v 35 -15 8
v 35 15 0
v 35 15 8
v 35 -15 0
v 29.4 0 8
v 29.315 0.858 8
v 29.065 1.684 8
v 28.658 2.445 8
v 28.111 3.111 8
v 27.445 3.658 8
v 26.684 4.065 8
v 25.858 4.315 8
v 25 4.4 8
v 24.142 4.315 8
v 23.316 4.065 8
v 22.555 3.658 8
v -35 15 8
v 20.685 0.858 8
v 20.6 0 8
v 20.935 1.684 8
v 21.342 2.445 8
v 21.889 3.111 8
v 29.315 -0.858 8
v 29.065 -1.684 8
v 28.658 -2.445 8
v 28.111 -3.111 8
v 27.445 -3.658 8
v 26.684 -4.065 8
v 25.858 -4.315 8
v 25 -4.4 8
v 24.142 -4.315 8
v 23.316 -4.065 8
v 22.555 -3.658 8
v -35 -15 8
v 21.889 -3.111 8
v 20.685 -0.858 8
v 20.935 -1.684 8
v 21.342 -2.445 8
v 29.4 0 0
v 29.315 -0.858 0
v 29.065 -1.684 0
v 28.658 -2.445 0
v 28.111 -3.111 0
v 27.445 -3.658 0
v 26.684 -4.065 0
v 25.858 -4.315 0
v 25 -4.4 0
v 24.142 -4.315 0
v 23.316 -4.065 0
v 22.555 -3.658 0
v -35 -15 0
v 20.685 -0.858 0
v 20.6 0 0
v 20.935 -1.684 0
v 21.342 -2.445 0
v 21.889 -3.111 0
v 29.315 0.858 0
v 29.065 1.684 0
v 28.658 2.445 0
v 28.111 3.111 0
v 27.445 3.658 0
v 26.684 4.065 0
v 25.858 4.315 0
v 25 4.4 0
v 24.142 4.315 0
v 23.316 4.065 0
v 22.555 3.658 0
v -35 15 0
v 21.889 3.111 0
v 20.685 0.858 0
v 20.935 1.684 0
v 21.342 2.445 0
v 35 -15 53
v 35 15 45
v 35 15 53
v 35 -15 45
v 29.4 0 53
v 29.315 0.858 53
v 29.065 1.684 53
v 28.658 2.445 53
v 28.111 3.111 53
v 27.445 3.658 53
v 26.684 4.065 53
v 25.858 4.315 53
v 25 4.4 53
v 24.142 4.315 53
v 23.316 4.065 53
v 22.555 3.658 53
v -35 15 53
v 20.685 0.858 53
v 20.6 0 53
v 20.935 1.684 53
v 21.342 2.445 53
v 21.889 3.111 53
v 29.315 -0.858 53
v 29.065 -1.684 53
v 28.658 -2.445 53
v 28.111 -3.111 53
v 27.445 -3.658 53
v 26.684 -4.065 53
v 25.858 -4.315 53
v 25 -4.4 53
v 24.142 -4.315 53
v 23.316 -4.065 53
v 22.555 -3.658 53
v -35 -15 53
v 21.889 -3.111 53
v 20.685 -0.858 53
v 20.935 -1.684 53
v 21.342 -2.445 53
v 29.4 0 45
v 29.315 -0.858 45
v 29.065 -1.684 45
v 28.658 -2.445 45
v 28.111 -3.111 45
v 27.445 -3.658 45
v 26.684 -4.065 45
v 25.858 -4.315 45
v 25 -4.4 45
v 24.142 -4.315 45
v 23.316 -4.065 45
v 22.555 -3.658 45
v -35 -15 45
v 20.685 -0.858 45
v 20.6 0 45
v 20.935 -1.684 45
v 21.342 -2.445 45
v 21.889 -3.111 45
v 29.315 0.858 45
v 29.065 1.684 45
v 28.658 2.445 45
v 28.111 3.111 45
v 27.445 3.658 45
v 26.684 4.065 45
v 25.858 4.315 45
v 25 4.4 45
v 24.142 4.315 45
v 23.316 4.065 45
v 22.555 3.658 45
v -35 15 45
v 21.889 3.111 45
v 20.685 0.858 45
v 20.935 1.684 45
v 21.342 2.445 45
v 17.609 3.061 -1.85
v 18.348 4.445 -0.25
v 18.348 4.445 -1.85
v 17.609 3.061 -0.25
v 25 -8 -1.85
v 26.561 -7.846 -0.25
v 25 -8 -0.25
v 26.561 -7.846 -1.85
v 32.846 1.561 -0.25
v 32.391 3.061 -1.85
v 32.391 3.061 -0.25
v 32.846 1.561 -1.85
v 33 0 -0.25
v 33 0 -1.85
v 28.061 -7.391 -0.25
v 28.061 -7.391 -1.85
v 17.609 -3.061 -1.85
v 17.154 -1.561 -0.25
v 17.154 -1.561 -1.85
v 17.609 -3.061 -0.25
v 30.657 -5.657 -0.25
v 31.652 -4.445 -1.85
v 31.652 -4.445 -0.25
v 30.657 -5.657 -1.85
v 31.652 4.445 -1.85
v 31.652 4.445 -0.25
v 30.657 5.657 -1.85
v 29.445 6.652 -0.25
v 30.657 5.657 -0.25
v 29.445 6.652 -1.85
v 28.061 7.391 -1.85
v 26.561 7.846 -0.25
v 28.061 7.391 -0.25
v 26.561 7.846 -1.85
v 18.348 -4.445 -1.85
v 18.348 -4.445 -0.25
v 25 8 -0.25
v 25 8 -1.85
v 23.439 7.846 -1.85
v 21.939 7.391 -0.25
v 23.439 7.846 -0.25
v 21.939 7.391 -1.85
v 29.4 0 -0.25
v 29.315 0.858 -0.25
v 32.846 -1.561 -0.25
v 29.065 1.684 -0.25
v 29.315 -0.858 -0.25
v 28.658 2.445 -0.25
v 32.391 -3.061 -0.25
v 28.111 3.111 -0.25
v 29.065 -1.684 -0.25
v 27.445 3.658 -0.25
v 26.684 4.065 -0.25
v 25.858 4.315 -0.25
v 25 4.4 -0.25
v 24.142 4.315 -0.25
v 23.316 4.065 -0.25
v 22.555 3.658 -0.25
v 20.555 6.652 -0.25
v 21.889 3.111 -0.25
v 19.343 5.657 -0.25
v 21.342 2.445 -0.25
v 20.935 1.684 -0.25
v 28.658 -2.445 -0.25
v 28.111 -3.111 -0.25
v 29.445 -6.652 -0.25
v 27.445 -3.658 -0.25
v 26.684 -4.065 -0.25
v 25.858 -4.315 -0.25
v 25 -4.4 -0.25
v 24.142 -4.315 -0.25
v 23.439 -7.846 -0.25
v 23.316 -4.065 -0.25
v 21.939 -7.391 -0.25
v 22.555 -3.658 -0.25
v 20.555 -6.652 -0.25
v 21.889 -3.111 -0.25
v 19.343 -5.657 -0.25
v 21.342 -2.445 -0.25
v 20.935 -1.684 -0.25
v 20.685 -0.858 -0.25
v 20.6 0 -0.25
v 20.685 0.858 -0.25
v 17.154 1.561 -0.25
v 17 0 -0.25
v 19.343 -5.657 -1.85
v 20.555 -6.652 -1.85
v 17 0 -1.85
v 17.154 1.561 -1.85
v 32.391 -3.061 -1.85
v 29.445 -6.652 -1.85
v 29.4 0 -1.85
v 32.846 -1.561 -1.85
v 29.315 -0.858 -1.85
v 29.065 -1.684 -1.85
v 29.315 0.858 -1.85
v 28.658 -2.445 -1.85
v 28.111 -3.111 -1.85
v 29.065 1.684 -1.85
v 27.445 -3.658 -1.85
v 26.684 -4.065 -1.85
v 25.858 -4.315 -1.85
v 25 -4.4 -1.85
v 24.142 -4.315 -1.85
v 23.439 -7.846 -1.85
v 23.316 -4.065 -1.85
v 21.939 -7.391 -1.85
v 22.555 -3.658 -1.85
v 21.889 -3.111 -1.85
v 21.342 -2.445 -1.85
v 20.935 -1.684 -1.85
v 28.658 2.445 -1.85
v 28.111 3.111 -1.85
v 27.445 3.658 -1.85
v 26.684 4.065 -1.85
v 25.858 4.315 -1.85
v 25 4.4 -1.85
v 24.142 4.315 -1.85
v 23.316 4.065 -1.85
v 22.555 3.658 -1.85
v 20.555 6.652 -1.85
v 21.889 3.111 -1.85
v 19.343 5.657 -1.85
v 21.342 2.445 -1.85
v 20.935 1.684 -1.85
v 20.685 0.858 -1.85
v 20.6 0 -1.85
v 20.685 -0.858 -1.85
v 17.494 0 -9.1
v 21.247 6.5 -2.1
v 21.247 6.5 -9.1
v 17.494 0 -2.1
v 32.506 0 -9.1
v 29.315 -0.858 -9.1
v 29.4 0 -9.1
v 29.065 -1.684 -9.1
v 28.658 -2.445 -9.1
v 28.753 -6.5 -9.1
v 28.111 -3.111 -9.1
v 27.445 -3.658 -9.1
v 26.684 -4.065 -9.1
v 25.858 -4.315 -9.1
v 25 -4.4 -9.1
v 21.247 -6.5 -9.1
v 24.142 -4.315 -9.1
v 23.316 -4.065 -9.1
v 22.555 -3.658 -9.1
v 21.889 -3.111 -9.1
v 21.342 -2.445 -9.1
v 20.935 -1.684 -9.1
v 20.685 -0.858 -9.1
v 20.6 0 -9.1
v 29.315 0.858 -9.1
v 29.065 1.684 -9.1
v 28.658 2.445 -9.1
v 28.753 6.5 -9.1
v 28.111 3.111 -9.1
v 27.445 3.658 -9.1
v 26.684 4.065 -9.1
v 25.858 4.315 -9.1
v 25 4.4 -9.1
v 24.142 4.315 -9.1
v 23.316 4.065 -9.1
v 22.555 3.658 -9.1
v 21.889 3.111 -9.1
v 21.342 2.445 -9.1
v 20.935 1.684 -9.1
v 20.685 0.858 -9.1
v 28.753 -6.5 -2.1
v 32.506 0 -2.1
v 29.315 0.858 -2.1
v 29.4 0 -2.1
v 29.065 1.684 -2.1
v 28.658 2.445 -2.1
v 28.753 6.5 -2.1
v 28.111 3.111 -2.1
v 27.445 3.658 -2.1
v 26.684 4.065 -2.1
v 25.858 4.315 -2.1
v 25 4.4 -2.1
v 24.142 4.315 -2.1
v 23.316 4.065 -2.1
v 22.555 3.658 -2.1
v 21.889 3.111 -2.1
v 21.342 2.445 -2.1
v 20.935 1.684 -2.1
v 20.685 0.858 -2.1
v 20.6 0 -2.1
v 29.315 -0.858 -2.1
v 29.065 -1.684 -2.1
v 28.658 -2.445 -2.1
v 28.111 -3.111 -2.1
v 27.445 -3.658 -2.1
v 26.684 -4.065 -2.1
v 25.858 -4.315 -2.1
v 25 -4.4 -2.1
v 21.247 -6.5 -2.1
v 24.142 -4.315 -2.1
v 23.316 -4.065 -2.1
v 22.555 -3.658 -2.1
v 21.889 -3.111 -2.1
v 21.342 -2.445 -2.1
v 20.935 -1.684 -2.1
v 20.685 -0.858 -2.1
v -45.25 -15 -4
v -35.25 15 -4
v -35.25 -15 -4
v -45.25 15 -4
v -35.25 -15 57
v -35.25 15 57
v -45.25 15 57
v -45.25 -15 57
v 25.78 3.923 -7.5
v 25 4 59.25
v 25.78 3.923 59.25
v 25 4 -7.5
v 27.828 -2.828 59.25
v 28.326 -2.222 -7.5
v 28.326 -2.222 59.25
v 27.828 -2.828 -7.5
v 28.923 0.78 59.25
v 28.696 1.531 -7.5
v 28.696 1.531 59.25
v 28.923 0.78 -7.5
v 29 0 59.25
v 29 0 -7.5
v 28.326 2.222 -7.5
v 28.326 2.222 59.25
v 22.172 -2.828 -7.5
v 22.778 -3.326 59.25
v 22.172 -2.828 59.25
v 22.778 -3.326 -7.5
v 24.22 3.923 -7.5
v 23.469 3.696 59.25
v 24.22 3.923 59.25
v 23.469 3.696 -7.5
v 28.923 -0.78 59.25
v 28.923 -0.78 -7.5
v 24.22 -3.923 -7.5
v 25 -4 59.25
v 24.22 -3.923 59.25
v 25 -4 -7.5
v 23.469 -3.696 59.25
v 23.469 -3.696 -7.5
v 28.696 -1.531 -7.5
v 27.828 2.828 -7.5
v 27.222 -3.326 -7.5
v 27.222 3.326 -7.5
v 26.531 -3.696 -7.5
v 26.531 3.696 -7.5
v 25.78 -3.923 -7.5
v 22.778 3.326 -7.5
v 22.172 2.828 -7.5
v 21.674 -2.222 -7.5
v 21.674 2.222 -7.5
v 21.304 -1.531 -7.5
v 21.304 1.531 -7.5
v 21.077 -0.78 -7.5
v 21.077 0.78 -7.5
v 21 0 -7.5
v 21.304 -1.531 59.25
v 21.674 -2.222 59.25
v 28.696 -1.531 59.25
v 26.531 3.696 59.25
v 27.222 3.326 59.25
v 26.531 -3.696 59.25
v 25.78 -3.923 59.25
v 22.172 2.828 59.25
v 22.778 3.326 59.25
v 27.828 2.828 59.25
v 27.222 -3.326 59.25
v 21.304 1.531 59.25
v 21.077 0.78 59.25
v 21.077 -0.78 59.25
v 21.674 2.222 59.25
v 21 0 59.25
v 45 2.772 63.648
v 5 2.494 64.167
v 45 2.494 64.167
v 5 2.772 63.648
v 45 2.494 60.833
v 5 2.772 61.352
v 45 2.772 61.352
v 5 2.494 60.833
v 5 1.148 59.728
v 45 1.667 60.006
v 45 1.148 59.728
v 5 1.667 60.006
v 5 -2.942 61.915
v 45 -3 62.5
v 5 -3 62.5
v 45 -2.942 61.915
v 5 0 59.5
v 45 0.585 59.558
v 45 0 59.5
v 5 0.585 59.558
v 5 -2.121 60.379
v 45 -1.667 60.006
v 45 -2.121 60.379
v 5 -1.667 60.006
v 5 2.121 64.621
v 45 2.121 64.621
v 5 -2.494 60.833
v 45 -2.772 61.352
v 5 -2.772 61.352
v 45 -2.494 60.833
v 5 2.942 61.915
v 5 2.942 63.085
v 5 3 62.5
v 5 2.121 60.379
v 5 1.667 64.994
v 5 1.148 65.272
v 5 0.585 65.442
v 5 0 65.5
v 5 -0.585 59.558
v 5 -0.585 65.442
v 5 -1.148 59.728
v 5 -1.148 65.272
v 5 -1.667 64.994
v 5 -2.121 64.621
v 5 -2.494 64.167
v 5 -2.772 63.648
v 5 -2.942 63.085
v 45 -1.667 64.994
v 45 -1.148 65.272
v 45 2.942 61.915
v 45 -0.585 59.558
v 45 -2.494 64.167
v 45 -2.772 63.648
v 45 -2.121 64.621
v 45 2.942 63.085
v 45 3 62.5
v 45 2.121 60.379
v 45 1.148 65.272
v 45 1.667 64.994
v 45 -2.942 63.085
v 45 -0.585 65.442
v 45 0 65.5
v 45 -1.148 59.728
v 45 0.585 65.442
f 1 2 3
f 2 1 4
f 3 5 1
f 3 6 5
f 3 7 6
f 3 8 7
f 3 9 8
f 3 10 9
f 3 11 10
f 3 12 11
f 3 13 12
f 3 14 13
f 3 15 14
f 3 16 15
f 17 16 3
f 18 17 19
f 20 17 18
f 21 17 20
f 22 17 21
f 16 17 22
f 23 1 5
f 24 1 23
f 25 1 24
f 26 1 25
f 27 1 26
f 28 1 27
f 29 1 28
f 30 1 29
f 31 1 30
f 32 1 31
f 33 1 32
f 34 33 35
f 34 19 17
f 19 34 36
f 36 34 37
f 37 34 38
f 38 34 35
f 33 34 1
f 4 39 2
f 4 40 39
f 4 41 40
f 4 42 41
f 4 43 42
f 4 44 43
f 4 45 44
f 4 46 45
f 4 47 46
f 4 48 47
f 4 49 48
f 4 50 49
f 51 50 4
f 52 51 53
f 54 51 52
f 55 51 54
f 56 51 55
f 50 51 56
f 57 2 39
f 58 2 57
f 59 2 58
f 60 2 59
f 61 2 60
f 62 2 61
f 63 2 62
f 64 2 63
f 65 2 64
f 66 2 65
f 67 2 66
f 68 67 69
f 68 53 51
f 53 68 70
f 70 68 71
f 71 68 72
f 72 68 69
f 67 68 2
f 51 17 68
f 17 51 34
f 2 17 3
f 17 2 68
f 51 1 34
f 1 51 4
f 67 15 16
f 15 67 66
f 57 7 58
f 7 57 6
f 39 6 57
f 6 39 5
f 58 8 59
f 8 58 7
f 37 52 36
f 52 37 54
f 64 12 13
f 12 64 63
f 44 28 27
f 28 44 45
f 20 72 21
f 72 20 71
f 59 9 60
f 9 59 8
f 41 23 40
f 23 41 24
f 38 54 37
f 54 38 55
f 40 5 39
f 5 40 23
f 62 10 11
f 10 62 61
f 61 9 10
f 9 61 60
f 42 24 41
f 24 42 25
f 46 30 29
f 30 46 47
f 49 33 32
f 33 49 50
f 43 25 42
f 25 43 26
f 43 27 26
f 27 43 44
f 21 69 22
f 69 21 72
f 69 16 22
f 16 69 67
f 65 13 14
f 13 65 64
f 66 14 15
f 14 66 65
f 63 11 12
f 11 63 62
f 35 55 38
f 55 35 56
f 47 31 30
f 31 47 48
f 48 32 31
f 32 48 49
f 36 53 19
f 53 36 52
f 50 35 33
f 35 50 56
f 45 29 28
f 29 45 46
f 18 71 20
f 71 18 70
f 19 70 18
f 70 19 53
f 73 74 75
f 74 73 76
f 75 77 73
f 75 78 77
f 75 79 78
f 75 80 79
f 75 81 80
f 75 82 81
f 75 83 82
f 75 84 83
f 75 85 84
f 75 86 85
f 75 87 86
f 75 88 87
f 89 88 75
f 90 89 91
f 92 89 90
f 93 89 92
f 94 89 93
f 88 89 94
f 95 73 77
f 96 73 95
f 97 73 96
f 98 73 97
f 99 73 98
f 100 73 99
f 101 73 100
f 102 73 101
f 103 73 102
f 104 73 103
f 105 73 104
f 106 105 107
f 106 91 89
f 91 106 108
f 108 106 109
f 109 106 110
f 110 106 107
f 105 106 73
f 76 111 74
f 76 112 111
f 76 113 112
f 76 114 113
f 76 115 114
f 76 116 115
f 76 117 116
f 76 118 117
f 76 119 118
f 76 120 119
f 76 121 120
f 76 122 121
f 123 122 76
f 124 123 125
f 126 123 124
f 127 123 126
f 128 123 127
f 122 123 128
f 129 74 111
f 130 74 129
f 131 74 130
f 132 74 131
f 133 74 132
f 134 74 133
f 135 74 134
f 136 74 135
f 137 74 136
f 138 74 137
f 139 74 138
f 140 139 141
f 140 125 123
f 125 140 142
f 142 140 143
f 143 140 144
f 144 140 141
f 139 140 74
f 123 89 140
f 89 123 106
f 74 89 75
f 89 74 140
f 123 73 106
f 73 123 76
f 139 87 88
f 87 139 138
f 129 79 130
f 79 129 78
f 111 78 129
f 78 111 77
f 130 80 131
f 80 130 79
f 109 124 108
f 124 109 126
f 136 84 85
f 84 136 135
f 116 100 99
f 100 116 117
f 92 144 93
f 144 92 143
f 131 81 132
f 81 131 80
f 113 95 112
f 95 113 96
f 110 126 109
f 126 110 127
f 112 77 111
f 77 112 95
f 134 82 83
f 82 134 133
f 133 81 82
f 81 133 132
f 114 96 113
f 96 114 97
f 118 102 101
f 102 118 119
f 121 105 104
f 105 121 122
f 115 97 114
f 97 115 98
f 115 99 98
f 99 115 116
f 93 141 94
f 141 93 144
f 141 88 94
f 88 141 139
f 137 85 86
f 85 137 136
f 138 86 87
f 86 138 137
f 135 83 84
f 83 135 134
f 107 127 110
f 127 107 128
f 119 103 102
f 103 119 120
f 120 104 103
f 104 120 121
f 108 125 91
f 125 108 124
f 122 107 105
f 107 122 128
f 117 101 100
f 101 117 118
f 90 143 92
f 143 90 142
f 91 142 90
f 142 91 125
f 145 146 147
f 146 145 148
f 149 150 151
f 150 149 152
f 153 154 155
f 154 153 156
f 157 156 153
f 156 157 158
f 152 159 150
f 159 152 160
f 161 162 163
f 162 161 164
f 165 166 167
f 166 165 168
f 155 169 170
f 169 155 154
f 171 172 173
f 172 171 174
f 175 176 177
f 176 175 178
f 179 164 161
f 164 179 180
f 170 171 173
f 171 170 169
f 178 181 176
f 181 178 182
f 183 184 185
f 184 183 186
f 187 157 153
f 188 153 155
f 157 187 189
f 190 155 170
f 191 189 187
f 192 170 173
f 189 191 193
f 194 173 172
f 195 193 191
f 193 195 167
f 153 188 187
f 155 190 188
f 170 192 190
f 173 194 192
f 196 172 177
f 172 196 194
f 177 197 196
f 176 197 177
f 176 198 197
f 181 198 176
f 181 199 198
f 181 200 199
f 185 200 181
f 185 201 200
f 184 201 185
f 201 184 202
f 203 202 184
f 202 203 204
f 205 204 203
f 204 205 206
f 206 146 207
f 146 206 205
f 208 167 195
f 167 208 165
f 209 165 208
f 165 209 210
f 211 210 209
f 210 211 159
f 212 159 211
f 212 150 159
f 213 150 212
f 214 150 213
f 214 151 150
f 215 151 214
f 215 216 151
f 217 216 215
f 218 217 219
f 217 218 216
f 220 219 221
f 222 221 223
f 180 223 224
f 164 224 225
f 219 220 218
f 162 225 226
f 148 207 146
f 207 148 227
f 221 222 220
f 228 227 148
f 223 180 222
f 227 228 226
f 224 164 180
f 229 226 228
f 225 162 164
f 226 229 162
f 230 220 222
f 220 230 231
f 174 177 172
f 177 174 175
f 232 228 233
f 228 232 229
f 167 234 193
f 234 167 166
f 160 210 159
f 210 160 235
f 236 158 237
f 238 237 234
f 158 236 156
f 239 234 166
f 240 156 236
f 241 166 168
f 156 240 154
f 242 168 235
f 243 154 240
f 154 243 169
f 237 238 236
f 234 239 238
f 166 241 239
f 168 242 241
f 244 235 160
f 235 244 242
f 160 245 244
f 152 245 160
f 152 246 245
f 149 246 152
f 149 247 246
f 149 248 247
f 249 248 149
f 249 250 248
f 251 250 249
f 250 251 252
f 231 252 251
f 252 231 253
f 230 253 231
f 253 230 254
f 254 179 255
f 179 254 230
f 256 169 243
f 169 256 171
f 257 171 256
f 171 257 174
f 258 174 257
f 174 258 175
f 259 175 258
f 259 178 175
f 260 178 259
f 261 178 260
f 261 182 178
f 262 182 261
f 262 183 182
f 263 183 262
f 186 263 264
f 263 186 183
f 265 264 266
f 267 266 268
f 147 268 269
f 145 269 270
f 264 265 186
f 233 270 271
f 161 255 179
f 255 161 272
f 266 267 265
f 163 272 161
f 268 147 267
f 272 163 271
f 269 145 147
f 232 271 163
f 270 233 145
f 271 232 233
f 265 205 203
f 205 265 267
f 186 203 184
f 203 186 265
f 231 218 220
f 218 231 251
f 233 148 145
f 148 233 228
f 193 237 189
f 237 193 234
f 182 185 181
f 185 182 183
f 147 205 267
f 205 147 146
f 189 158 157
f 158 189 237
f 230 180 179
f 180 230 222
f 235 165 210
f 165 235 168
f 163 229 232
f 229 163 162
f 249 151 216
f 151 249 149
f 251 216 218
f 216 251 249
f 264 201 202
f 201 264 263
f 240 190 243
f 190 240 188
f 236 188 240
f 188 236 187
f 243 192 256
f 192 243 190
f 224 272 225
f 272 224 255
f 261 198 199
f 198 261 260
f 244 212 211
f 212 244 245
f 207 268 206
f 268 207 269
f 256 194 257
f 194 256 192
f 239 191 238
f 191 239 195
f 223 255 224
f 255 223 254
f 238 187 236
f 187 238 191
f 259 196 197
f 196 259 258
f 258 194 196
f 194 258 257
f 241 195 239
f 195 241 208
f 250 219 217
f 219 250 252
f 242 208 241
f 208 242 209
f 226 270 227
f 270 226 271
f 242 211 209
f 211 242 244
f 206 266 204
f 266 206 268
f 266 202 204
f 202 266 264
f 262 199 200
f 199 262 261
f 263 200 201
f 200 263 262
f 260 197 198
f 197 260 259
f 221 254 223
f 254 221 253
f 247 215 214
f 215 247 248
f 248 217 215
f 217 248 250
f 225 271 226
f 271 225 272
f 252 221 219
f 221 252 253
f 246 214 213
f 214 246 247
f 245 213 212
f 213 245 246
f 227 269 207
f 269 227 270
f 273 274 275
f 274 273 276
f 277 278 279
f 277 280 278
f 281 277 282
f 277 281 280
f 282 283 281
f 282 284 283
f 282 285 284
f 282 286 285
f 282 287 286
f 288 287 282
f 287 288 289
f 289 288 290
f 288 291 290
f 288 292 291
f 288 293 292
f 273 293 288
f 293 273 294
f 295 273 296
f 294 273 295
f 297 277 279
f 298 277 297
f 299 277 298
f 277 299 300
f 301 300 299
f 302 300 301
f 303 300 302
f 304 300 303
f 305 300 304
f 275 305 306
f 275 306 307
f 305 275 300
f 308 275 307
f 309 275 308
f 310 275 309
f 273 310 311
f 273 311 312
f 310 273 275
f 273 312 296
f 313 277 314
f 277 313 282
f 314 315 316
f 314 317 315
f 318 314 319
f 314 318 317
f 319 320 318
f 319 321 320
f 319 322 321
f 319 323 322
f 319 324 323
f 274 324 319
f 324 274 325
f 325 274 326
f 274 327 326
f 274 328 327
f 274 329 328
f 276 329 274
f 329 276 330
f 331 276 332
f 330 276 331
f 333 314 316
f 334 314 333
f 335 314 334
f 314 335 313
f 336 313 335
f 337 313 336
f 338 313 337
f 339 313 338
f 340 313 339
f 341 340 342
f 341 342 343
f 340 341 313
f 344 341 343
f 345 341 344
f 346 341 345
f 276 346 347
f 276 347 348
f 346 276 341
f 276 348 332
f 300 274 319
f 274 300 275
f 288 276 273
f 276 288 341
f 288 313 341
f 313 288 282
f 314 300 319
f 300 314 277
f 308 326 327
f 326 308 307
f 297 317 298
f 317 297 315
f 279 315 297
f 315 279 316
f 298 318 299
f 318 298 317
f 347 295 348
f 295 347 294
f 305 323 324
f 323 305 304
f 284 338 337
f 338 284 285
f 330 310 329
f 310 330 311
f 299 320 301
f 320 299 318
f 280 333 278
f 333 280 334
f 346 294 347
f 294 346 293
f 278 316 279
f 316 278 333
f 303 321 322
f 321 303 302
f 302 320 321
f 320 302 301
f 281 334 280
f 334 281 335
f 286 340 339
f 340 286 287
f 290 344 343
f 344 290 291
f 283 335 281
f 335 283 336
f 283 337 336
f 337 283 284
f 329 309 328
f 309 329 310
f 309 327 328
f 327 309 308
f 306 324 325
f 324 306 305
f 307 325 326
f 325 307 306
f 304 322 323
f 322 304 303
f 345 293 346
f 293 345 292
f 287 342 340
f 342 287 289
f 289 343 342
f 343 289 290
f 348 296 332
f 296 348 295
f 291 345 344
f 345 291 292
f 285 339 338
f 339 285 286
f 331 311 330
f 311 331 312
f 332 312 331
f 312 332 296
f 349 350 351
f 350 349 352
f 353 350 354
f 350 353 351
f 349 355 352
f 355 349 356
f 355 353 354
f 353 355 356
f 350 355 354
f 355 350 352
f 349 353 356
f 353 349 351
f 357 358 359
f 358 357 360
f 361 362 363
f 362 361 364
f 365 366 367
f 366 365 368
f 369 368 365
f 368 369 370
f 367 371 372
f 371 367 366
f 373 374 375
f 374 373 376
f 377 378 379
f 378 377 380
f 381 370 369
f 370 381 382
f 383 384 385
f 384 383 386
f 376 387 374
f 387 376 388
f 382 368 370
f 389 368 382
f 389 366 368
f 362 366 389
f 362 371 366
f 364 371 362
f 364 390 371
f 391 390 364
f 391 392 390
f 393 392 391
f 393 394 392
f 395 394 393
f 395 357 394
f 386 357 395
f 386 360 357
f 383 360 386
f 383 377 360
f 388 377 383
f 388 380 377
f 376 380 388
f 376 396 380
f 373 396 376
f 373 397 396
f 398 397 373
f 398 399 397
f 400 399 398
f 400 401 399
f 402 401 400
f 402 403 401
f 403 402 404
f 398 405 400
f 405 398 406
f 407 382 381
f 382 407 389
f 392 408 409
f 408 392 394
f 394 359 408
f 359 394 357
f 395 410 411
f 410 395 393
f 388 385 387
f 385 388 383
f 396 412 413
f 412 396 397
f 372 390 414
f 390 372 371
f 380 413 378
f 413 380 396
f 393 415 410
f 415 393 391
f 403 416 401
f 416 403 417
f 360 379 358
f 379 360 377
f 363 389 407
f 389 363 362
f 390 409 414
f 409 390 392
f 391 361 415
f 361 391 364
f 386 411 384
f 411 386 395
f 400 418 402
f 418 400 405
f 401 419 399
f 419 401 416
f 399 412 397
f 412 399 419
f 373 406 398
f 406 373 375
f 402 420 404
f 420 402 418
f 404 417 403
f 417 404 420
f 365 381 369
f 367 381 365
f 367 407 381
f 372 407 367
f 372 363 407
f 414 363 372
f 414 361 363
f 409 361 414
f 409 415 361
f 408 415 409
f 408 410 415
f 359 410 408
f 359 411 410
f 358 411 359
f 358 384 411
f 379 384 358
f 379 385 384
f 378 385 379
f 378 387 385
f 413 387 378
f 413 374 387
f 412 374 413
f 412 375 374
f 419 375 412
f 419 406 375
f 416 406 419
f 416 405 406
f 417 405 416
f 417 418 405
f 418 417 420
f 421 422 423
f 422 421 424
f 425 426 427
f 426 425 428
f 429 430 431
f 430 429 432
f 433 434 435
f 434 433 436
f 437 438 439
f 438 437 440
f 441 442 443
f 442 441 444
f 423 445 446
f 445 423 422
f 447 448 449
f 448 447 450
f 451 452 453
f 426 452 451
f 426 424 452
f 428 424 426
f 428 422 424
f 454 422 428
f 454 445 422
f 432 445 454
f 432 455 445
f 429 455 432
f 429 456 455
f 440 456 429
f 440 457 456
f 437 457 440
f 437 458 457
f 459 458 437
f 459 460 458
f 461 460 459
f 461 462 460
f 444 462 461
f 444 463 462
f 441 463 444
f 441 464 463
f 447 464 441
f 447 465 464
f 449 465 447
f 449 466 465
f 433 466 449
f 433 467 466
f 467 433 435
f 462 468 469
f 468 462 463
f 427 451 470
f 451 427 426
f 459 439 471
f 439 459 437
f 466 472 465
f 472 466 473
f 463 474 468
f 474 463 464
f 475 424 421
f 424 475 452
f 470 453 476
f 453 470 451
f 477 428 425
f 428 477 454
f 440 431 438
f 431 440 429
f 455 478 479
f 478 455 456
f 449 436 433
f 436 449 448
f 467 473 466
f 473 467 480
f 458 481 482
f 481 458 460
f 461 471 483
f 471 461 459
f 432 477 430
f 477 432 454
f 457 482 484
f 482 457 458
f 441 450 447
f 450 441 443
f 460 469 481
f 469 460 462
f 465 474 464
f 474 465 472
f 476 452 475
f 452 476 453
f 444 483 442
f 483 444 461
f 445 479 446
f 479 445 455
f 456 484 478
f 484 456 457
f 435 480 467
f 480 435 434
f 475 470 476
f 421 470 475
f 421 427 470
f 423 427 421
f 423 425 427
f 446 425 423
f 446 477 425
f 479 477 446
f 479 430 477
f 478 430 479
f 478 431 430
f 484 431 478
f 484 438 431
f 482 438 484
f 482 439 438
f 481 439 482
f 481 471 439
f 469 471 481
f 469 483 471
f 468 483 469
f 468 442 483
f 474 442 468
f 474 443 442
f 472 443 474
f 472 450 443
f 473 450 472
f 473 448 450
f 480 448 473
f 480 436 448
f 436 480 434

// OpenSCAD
$fn = 32;

// ------------------------------------------------------------------------
// C clamp: throat 45 mm, screw d8
// Every part is its own module, assembly() places every instance.
// ------------------------------------------------------------------------

// --- part 1 ---
module clamp_arm() {
  difference() {
    translate([-35, -15, 0]) cube([70, 30, 8]);
    translate([25, 0, -1]) cylinder(h = 10, d = 8.8);
  }
}

// --- part 2 ---
module clamp_spine() {
  difference() {
    translate([-30.5, -15, 0]) cube([61, 30, 10]);
  }
}

// --- part 3 ---
module clamp_screw() {
  translate([0, 0, -33.375]) cylinder(h = 66.75, d = 8);
}

// --- part 4 ---
module clamp_washer() {
  difference() {
      translate([0, 0, 0]) cylinder(h = 1.6, d = 16);
      translate([0, 0, -1]) cylinder(h = 3.6, d = 8.8);
    }
}

// --- part 5 ---
module clamp_nut() {
  difference() {
    linear_extrude(height = 7) polygon(points = [[7.506, 0], [3.753, 6.5], [-3.753, 6.5], [-7.506, 0], [-3.753, -6.5], [3.753, -6.5]]);
    translate([0, 0, -1]) cylinder(h = 9, d = 8.8);
  }
}

// --- part 6 ---
module tommy_bar() {
  translate([0, 0, -20]) cylinder(h = 40, d = 6);
}

// --- assembly ---
module assembly() {
  color([0.80, 0.24, 0.20]) translate([0, 0, 0]) rotate([0, 0, 0]) clamp_arm();
  color([0.20, 0.45, 0.75]) translate([0, 0, 45]) rotate([0, 0, 0]) clamp_arm();
  color([0.25, 0.62, 0.32]) translate([-45.25, 0, 26.5]) rotate([0, 90, 0]) clamp_spine();
  color([0.92, 0.70, 0.18]) translate([25, 0, 25.875]) rotate([0, 0, 0]) clamp_screw();
  color([0.58, 0.35, 0.70]) translate([25, 0, -1.85]) rotate([0, 0, 0]) clamp_washer();
  color([0.16, 0.66, 0.66]) translate([25, 0, -9.1]) rotate([0, 0, 0]) clamp_nut();
  color([0.85, 0.48, 0.18]) translate([25, 0, 62.5]) rotate([0, 90, 0]) tommy_bar();
}

assembly();
